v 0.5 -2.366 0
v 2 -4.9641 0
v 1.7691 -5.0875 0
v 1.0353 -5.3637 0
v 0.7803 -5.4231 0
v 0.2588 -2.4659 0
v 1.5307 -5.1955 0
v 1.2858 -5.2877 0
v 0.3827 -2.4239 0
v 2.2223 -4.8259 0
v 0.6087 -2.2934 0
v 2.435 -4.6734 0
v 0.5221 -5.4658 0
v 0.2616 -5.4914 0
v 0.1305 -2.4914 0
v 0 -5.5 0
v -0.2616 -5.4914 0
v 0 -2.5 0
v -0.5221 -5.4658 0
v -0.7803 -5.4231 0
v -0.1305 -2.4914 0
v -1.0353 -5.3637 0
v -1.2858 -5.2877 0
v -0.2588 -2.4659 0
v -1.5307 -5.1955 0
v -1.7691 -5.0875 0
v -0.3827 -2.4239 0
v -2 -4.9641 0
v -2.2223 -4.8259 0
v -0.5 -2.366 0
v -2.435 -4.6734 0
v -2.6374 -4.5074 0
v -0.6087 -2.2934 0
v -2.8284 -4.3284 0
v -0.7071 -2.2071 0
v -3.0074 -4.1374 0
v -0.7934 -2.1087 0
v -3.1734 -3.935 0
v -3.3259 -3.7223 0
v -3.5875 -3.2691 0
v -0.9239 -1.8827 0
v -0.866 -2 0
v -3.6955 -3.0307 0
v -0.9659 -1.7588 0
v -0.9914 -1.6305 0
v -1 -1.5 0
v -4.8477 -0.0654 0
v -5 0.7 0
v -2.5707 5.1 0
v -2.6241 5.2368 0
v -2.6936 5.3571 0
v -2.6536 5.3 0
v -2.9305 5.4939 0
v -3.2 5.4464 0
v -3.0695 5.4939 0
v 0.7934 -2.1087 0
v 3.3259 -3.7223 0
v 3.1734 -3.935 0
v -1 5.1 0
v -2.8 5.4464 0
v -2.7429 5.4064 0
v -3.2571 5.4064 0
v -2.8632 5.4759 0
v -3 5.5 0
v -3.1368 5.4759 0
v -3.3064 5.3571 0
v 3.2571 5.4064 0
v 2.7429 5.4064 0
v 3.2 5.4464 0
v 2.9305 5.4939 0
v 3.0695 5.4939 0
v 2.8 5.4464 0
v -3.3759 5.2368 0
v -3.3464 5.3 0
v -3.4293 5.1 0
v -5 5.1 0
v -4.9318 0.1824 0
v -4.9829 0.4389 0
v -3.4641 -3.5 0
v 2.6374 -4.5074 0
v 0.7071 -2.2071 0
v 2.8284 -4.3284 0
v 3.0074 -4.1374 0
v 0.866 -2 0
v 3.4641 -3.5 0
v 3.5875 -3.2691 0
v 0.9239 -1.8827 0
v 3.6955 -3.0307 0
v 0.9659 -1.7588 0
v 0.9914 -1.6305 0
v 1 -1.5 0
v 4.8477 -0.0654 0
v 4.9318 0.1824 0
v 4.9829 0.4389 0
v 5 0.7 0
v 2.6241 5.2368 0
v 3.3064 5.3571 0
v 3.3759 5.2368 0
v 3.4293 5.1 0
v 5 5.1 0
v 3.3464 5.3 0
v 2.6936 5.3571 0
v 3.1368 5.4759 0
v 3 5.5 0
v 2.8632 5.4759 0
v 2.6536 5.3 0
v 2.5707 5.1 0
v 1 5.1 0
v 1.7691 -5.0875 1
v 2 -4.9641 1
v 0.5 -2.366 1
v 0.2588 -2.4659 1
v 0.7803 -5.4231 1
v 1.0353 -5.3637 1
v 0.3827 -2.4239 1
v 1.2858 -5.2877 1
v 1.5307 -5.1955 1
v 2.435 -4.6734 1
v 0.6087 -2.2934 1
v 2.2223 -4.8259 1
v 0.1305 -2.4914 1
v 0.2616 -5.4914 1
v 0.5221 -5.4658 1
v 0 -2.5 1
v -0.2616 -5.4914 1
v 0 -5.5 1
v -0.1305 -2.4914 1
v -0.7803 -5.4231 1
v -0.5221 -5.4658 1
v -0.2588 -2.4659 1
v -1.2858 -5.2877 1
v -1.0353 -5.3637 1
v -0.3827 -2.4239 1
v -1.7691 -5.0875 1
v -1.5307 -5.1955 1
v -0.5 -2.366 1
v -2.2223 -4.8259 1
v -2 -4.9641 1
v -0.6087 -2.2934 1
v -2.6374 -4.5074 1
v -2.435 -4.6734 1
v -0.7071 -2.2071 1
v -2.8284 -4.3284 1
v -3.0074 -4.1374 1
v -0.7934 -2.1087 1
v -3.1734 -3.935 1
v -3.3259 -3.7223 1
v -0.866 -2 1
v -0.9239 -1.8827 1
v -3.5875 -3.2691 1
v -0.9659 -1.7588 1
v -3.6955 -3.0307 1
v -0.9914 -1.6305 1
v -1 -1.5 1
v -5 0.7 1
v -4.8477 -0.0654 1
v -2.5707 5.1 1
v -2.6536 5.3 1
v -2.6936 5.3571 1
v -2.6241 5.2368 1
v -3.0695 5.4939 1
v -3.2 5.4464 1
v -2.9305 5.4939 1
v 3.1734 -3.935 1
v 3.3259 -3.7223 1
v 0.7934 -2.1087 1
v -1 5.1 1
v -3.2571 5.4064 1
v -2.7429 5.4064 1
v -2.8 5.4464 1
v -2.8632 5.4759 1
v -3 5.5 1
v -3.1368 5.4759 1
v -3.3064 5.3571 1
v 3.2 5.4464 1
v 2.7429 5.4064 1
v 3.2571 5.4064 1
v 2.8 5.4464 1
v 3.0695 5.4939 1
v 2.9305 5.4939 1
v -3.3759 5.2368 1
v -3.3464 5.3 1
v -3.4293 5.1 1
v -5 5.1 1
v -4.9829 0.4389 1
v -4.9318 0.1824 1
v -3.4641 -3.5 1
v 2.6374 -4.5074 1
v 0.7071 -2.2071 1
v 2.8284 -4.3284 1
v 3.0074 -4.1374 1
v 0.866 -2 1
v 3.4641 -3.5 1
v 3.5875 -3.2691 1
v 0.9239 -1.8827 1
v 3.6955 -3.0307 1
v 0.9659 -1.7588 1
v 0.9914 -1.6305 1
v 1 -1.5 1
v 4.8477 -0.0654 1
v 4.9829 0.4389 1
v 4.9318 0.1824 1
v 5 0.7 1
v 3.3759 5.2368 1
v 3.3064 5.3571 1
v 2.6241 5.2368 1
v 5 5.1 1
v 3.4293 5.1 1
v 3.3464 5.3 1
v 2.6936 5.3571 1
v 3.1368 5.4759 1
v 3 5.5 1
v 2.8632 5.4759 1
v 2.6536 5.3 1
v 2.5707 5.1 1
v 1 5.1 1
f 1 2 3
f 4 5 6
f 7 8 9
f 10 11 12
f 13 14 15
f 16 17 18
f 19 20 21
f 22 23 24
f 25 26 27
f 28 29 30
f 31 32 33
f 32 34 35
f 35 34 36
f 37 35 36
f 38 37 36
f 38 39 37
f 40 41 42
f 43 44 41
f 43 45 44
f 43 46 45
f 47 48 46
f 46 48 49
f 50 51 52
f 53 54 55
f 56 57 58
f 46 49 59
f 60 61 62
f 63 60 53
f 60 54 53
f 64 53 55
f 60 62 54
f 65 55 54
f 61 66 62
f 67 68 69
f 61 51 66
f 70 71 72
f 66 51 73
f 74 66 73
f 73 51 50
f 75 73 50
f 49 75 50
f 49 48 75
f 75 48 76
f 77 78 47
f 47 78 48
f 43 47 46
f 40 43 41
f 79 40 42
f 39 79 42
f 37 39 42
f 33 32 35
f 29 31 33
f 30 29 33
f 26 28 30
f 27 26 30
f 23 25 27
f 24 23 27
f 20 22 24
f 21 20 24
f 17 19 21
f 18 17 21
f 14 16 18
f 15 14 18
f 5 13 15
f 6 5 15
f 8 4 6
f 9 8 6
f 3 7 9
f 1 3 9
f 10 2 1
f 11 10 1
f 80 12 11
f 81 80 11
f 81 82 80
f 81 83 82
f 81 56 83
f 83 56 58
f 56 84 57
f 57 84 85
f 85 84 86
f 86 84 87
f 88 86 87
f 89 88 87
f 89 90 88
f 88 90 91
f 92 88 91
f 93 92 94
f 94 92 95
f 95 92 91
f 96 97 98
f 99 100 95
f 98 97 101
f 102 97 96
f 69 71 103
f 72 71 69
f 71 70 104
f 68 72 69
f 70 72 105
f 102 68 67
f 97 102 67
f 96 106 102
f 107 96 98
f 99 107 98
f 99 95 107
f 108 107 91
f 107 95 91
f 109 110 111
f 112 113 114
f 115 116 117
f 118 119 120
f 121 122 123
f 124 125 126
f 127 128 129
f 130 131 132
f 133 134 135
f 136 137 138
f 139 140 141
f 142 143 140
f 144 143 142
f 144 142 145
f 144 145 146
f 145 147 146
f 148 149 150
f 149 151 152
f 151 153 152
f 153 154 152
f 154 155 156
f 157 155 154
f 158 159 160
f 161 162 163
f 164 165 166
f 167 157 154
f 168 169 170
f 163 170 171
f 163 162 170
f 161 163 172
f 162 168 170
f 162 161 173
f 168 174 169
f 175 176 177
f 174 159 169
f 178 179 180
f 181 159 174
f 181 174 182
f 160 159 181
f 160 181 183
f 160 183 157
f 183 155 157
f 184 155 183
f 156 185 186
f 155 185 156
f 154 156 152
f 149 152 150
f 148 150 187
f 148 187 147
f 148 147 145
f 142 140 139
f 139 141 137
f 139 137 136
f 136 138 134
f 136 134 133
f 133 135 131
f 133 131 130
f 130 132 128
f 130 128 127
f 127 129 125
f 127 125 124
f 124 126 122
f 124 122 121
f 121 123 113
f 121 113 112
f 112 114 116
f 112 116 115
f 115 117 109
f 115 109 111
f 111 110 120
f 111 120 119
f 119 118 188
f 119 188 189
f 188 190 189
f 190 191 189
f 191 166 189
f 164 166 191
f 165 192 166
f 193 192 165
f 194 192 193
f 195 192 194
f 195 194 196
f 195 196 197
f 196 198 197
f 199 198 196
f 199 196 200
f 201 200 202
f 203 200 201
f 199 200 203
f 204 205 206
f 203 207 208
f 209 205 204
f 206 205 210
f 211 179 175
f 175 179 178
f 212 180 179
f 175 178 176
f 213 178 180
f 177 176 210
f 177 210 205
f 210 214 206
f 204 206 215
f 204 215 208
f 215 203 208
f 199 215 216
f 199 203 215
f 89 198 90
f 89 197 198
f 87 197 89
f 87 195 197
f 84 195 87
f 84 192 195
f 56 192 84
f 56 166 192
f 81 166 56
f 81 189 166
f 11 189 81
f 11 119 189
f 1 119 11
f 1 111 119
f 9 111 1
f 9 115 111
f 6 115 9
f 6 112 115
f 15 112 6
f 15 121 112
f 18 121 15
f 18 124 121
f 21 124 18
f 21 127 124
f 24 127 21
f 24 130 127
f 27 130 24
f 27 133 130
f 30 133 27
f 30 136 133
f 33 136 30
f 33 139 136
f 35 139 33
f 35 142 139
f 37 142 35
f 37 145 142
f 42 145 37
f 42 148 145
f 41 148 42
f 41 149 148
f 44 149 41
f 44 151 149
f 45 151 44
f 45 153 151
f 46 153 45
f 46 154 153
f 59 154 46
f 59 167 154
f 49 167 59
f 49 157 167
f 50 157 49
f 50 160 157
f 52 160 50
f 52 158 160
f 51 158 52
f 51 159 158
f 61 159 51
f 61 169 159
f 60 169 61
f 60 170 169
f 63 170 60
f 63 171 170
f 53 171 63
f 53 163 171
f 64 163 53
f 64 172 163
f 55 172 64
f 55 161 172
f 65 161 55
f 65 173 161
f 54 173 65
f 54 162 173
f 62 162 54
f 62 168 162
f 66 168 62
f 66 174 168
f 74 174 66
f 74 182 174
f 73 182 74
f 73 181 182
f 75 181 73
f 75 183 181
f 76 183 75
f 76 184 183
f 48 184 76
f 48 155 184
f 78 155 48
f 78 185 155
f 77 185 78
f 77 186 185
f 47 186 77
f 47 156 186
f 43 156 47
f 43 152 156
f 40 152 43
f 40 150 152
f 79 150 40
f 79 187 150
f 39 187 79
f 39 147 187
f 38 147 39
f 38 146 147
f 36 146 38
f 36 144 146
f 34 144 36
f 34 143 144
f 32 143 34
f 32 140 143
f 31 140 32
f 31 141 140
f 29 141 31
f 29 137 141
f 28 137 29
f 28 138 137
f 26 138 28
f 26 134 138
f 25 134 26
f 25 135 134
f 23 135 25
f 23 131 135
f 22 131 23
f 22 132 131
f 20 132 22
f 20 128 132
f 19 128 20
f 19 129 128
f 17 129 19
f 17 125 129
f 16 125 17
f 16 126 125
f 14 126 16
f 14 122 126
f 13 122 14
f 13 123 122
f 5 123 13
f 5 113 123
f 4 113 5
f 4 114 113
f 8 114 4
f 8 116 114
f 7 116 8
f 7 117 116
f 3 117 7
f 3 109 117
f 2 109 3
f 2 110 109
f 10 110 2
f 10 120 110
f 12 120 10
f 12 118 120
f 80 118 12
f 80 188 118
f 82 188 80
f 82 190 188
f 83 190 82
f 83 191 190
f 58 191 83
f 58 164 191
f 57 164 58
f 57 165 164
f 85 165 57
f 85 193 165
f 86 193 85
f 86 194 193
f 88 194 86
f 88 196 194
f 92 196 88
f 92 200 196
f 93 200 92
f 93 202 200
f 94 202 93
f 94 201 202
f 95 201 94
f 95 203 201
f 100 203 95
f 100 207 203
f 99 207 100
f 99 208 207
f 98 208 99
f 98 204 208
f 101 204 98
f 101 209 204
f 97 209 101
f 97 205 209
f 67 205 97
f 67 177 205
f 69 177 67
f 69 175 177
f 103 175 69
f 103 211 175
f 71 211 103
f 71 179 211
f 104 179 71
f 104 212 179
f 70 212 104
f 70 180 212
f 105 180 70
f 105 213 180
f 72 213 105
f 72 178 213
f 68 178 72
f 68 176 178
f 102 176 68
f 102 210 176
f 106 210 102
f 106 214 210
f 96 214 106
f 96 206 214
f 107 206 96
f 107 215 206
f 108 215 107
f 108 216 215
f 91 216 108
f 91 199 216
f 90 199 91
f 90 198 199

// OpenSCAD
// file: cpf_fork_common.scad
// Shared scaffold helpers for DRW-005 Sheet 3 fork parts.
// Keeps cp-f1 through cp-f6 dimension-driven and easy to tune from the drawing.
// SPDX-License-Identifier: MIT

module cpf_fork_profile_2d(
    body_r,
    slot_w,
    slot_l,
    overall_w,
    overall_l,
    shoulder_r,
    tip_r,
    center = true
) {
    stem_x = slot_w / 2 + (overall_w - slot_w) / 2;
    stem_w = overall_w - slot_w;
    top_y = overall_l - tip_r;
    shoulder_y = max(body_r * 0.55, overall_l - slot_l - shoulder_r);
    slot_floor_y = max(0, overall_l - slot_l - slot_w / 2);
    y_center = (overall_l - body_r) / 2;

    translate([0, center ? -y_center : 0])
    difference() {
        union() {
            circle(r = body_r, $fn = 96);

            hull() {
                circle(r = body_r, $fn = 96);
                for (side = [-1, 1]) {
                    translate([side * (slot_w / 2 + shoulder_r), shoulder_y])
                        circle(r = shoulder_r, $fn = 48);
                }
            }

            for (side = [-1, 1]) {
                hull() {
                    translate([side * (slot_w / 2 + shoulder_r), shoulder_y])
                        circle(r = shoulder_r, $fn = 48);
                    translate([side * stem_x, top_y])
                        circle(r = tip_r, $fn = 36);
                }

                translate([side * stem_x - stem_w / 2, shoulder_y])
                    square([stem_w, max(0.01, top_y - shoulder_y)], center = false);
            }
        }

        union() {
            hull() {
                translate([0, slot_floor_y]) circle(r = slot_w / 2, $fn = 48);
                translate([0, overall_l - slot_w / 2])
                    circle(r = slot_w / 2, $fn = 48);
            }

            translate([-slot_w / 2, slot_floor_y])
                square([slot_w, max(0.01, overall_l - slot_w / 2 - slot_floor_y)], center = false);
        }
    }
}

module cpf_fork_part(
    body_r,
    slot_w,
    slot_l,
    overall_w,
    overall_l,
    shoulder_r,
    tip_r,
    thickness = 1.0,
    center = true
) {
    linear_extrude(height = thickness)
        cpf_fork_profile_2d(
            body_r = body_r,
            slot_w = slot_w,
            slot_l = slot_l,
            overall_w = overall_w,
            overall_l = overall_l,
            shoulder_r = shoulder_r,
            tip_r = tip_r,
            center = center
        );
}
// main file
// part_id: cp-f2
// name: Fork 2W 4D 6L 7T
// source_drawing_ids: DRW-005
// units: mm
// revision: 0.1
// SPDX-License-Identifier: MIT

use <cpf_fork_common.scad>

module part_cpf2(th = 1.0) {
    cpf_fork_part(
        body_r = 4.0,
        slot_w = 2.0,
        slot_l = 6.0,
        overall_w = 6.0,
        overall_l = 7.0,
        shoulder_r = 2.0,
        tip_r = 0.4,
        thickness = th
    );
}

// ---- "main guard" ----
// Default to previewing when opened directly:
if (is_undef(__LIB_MODE__)) {
    part_cpf2();
}
